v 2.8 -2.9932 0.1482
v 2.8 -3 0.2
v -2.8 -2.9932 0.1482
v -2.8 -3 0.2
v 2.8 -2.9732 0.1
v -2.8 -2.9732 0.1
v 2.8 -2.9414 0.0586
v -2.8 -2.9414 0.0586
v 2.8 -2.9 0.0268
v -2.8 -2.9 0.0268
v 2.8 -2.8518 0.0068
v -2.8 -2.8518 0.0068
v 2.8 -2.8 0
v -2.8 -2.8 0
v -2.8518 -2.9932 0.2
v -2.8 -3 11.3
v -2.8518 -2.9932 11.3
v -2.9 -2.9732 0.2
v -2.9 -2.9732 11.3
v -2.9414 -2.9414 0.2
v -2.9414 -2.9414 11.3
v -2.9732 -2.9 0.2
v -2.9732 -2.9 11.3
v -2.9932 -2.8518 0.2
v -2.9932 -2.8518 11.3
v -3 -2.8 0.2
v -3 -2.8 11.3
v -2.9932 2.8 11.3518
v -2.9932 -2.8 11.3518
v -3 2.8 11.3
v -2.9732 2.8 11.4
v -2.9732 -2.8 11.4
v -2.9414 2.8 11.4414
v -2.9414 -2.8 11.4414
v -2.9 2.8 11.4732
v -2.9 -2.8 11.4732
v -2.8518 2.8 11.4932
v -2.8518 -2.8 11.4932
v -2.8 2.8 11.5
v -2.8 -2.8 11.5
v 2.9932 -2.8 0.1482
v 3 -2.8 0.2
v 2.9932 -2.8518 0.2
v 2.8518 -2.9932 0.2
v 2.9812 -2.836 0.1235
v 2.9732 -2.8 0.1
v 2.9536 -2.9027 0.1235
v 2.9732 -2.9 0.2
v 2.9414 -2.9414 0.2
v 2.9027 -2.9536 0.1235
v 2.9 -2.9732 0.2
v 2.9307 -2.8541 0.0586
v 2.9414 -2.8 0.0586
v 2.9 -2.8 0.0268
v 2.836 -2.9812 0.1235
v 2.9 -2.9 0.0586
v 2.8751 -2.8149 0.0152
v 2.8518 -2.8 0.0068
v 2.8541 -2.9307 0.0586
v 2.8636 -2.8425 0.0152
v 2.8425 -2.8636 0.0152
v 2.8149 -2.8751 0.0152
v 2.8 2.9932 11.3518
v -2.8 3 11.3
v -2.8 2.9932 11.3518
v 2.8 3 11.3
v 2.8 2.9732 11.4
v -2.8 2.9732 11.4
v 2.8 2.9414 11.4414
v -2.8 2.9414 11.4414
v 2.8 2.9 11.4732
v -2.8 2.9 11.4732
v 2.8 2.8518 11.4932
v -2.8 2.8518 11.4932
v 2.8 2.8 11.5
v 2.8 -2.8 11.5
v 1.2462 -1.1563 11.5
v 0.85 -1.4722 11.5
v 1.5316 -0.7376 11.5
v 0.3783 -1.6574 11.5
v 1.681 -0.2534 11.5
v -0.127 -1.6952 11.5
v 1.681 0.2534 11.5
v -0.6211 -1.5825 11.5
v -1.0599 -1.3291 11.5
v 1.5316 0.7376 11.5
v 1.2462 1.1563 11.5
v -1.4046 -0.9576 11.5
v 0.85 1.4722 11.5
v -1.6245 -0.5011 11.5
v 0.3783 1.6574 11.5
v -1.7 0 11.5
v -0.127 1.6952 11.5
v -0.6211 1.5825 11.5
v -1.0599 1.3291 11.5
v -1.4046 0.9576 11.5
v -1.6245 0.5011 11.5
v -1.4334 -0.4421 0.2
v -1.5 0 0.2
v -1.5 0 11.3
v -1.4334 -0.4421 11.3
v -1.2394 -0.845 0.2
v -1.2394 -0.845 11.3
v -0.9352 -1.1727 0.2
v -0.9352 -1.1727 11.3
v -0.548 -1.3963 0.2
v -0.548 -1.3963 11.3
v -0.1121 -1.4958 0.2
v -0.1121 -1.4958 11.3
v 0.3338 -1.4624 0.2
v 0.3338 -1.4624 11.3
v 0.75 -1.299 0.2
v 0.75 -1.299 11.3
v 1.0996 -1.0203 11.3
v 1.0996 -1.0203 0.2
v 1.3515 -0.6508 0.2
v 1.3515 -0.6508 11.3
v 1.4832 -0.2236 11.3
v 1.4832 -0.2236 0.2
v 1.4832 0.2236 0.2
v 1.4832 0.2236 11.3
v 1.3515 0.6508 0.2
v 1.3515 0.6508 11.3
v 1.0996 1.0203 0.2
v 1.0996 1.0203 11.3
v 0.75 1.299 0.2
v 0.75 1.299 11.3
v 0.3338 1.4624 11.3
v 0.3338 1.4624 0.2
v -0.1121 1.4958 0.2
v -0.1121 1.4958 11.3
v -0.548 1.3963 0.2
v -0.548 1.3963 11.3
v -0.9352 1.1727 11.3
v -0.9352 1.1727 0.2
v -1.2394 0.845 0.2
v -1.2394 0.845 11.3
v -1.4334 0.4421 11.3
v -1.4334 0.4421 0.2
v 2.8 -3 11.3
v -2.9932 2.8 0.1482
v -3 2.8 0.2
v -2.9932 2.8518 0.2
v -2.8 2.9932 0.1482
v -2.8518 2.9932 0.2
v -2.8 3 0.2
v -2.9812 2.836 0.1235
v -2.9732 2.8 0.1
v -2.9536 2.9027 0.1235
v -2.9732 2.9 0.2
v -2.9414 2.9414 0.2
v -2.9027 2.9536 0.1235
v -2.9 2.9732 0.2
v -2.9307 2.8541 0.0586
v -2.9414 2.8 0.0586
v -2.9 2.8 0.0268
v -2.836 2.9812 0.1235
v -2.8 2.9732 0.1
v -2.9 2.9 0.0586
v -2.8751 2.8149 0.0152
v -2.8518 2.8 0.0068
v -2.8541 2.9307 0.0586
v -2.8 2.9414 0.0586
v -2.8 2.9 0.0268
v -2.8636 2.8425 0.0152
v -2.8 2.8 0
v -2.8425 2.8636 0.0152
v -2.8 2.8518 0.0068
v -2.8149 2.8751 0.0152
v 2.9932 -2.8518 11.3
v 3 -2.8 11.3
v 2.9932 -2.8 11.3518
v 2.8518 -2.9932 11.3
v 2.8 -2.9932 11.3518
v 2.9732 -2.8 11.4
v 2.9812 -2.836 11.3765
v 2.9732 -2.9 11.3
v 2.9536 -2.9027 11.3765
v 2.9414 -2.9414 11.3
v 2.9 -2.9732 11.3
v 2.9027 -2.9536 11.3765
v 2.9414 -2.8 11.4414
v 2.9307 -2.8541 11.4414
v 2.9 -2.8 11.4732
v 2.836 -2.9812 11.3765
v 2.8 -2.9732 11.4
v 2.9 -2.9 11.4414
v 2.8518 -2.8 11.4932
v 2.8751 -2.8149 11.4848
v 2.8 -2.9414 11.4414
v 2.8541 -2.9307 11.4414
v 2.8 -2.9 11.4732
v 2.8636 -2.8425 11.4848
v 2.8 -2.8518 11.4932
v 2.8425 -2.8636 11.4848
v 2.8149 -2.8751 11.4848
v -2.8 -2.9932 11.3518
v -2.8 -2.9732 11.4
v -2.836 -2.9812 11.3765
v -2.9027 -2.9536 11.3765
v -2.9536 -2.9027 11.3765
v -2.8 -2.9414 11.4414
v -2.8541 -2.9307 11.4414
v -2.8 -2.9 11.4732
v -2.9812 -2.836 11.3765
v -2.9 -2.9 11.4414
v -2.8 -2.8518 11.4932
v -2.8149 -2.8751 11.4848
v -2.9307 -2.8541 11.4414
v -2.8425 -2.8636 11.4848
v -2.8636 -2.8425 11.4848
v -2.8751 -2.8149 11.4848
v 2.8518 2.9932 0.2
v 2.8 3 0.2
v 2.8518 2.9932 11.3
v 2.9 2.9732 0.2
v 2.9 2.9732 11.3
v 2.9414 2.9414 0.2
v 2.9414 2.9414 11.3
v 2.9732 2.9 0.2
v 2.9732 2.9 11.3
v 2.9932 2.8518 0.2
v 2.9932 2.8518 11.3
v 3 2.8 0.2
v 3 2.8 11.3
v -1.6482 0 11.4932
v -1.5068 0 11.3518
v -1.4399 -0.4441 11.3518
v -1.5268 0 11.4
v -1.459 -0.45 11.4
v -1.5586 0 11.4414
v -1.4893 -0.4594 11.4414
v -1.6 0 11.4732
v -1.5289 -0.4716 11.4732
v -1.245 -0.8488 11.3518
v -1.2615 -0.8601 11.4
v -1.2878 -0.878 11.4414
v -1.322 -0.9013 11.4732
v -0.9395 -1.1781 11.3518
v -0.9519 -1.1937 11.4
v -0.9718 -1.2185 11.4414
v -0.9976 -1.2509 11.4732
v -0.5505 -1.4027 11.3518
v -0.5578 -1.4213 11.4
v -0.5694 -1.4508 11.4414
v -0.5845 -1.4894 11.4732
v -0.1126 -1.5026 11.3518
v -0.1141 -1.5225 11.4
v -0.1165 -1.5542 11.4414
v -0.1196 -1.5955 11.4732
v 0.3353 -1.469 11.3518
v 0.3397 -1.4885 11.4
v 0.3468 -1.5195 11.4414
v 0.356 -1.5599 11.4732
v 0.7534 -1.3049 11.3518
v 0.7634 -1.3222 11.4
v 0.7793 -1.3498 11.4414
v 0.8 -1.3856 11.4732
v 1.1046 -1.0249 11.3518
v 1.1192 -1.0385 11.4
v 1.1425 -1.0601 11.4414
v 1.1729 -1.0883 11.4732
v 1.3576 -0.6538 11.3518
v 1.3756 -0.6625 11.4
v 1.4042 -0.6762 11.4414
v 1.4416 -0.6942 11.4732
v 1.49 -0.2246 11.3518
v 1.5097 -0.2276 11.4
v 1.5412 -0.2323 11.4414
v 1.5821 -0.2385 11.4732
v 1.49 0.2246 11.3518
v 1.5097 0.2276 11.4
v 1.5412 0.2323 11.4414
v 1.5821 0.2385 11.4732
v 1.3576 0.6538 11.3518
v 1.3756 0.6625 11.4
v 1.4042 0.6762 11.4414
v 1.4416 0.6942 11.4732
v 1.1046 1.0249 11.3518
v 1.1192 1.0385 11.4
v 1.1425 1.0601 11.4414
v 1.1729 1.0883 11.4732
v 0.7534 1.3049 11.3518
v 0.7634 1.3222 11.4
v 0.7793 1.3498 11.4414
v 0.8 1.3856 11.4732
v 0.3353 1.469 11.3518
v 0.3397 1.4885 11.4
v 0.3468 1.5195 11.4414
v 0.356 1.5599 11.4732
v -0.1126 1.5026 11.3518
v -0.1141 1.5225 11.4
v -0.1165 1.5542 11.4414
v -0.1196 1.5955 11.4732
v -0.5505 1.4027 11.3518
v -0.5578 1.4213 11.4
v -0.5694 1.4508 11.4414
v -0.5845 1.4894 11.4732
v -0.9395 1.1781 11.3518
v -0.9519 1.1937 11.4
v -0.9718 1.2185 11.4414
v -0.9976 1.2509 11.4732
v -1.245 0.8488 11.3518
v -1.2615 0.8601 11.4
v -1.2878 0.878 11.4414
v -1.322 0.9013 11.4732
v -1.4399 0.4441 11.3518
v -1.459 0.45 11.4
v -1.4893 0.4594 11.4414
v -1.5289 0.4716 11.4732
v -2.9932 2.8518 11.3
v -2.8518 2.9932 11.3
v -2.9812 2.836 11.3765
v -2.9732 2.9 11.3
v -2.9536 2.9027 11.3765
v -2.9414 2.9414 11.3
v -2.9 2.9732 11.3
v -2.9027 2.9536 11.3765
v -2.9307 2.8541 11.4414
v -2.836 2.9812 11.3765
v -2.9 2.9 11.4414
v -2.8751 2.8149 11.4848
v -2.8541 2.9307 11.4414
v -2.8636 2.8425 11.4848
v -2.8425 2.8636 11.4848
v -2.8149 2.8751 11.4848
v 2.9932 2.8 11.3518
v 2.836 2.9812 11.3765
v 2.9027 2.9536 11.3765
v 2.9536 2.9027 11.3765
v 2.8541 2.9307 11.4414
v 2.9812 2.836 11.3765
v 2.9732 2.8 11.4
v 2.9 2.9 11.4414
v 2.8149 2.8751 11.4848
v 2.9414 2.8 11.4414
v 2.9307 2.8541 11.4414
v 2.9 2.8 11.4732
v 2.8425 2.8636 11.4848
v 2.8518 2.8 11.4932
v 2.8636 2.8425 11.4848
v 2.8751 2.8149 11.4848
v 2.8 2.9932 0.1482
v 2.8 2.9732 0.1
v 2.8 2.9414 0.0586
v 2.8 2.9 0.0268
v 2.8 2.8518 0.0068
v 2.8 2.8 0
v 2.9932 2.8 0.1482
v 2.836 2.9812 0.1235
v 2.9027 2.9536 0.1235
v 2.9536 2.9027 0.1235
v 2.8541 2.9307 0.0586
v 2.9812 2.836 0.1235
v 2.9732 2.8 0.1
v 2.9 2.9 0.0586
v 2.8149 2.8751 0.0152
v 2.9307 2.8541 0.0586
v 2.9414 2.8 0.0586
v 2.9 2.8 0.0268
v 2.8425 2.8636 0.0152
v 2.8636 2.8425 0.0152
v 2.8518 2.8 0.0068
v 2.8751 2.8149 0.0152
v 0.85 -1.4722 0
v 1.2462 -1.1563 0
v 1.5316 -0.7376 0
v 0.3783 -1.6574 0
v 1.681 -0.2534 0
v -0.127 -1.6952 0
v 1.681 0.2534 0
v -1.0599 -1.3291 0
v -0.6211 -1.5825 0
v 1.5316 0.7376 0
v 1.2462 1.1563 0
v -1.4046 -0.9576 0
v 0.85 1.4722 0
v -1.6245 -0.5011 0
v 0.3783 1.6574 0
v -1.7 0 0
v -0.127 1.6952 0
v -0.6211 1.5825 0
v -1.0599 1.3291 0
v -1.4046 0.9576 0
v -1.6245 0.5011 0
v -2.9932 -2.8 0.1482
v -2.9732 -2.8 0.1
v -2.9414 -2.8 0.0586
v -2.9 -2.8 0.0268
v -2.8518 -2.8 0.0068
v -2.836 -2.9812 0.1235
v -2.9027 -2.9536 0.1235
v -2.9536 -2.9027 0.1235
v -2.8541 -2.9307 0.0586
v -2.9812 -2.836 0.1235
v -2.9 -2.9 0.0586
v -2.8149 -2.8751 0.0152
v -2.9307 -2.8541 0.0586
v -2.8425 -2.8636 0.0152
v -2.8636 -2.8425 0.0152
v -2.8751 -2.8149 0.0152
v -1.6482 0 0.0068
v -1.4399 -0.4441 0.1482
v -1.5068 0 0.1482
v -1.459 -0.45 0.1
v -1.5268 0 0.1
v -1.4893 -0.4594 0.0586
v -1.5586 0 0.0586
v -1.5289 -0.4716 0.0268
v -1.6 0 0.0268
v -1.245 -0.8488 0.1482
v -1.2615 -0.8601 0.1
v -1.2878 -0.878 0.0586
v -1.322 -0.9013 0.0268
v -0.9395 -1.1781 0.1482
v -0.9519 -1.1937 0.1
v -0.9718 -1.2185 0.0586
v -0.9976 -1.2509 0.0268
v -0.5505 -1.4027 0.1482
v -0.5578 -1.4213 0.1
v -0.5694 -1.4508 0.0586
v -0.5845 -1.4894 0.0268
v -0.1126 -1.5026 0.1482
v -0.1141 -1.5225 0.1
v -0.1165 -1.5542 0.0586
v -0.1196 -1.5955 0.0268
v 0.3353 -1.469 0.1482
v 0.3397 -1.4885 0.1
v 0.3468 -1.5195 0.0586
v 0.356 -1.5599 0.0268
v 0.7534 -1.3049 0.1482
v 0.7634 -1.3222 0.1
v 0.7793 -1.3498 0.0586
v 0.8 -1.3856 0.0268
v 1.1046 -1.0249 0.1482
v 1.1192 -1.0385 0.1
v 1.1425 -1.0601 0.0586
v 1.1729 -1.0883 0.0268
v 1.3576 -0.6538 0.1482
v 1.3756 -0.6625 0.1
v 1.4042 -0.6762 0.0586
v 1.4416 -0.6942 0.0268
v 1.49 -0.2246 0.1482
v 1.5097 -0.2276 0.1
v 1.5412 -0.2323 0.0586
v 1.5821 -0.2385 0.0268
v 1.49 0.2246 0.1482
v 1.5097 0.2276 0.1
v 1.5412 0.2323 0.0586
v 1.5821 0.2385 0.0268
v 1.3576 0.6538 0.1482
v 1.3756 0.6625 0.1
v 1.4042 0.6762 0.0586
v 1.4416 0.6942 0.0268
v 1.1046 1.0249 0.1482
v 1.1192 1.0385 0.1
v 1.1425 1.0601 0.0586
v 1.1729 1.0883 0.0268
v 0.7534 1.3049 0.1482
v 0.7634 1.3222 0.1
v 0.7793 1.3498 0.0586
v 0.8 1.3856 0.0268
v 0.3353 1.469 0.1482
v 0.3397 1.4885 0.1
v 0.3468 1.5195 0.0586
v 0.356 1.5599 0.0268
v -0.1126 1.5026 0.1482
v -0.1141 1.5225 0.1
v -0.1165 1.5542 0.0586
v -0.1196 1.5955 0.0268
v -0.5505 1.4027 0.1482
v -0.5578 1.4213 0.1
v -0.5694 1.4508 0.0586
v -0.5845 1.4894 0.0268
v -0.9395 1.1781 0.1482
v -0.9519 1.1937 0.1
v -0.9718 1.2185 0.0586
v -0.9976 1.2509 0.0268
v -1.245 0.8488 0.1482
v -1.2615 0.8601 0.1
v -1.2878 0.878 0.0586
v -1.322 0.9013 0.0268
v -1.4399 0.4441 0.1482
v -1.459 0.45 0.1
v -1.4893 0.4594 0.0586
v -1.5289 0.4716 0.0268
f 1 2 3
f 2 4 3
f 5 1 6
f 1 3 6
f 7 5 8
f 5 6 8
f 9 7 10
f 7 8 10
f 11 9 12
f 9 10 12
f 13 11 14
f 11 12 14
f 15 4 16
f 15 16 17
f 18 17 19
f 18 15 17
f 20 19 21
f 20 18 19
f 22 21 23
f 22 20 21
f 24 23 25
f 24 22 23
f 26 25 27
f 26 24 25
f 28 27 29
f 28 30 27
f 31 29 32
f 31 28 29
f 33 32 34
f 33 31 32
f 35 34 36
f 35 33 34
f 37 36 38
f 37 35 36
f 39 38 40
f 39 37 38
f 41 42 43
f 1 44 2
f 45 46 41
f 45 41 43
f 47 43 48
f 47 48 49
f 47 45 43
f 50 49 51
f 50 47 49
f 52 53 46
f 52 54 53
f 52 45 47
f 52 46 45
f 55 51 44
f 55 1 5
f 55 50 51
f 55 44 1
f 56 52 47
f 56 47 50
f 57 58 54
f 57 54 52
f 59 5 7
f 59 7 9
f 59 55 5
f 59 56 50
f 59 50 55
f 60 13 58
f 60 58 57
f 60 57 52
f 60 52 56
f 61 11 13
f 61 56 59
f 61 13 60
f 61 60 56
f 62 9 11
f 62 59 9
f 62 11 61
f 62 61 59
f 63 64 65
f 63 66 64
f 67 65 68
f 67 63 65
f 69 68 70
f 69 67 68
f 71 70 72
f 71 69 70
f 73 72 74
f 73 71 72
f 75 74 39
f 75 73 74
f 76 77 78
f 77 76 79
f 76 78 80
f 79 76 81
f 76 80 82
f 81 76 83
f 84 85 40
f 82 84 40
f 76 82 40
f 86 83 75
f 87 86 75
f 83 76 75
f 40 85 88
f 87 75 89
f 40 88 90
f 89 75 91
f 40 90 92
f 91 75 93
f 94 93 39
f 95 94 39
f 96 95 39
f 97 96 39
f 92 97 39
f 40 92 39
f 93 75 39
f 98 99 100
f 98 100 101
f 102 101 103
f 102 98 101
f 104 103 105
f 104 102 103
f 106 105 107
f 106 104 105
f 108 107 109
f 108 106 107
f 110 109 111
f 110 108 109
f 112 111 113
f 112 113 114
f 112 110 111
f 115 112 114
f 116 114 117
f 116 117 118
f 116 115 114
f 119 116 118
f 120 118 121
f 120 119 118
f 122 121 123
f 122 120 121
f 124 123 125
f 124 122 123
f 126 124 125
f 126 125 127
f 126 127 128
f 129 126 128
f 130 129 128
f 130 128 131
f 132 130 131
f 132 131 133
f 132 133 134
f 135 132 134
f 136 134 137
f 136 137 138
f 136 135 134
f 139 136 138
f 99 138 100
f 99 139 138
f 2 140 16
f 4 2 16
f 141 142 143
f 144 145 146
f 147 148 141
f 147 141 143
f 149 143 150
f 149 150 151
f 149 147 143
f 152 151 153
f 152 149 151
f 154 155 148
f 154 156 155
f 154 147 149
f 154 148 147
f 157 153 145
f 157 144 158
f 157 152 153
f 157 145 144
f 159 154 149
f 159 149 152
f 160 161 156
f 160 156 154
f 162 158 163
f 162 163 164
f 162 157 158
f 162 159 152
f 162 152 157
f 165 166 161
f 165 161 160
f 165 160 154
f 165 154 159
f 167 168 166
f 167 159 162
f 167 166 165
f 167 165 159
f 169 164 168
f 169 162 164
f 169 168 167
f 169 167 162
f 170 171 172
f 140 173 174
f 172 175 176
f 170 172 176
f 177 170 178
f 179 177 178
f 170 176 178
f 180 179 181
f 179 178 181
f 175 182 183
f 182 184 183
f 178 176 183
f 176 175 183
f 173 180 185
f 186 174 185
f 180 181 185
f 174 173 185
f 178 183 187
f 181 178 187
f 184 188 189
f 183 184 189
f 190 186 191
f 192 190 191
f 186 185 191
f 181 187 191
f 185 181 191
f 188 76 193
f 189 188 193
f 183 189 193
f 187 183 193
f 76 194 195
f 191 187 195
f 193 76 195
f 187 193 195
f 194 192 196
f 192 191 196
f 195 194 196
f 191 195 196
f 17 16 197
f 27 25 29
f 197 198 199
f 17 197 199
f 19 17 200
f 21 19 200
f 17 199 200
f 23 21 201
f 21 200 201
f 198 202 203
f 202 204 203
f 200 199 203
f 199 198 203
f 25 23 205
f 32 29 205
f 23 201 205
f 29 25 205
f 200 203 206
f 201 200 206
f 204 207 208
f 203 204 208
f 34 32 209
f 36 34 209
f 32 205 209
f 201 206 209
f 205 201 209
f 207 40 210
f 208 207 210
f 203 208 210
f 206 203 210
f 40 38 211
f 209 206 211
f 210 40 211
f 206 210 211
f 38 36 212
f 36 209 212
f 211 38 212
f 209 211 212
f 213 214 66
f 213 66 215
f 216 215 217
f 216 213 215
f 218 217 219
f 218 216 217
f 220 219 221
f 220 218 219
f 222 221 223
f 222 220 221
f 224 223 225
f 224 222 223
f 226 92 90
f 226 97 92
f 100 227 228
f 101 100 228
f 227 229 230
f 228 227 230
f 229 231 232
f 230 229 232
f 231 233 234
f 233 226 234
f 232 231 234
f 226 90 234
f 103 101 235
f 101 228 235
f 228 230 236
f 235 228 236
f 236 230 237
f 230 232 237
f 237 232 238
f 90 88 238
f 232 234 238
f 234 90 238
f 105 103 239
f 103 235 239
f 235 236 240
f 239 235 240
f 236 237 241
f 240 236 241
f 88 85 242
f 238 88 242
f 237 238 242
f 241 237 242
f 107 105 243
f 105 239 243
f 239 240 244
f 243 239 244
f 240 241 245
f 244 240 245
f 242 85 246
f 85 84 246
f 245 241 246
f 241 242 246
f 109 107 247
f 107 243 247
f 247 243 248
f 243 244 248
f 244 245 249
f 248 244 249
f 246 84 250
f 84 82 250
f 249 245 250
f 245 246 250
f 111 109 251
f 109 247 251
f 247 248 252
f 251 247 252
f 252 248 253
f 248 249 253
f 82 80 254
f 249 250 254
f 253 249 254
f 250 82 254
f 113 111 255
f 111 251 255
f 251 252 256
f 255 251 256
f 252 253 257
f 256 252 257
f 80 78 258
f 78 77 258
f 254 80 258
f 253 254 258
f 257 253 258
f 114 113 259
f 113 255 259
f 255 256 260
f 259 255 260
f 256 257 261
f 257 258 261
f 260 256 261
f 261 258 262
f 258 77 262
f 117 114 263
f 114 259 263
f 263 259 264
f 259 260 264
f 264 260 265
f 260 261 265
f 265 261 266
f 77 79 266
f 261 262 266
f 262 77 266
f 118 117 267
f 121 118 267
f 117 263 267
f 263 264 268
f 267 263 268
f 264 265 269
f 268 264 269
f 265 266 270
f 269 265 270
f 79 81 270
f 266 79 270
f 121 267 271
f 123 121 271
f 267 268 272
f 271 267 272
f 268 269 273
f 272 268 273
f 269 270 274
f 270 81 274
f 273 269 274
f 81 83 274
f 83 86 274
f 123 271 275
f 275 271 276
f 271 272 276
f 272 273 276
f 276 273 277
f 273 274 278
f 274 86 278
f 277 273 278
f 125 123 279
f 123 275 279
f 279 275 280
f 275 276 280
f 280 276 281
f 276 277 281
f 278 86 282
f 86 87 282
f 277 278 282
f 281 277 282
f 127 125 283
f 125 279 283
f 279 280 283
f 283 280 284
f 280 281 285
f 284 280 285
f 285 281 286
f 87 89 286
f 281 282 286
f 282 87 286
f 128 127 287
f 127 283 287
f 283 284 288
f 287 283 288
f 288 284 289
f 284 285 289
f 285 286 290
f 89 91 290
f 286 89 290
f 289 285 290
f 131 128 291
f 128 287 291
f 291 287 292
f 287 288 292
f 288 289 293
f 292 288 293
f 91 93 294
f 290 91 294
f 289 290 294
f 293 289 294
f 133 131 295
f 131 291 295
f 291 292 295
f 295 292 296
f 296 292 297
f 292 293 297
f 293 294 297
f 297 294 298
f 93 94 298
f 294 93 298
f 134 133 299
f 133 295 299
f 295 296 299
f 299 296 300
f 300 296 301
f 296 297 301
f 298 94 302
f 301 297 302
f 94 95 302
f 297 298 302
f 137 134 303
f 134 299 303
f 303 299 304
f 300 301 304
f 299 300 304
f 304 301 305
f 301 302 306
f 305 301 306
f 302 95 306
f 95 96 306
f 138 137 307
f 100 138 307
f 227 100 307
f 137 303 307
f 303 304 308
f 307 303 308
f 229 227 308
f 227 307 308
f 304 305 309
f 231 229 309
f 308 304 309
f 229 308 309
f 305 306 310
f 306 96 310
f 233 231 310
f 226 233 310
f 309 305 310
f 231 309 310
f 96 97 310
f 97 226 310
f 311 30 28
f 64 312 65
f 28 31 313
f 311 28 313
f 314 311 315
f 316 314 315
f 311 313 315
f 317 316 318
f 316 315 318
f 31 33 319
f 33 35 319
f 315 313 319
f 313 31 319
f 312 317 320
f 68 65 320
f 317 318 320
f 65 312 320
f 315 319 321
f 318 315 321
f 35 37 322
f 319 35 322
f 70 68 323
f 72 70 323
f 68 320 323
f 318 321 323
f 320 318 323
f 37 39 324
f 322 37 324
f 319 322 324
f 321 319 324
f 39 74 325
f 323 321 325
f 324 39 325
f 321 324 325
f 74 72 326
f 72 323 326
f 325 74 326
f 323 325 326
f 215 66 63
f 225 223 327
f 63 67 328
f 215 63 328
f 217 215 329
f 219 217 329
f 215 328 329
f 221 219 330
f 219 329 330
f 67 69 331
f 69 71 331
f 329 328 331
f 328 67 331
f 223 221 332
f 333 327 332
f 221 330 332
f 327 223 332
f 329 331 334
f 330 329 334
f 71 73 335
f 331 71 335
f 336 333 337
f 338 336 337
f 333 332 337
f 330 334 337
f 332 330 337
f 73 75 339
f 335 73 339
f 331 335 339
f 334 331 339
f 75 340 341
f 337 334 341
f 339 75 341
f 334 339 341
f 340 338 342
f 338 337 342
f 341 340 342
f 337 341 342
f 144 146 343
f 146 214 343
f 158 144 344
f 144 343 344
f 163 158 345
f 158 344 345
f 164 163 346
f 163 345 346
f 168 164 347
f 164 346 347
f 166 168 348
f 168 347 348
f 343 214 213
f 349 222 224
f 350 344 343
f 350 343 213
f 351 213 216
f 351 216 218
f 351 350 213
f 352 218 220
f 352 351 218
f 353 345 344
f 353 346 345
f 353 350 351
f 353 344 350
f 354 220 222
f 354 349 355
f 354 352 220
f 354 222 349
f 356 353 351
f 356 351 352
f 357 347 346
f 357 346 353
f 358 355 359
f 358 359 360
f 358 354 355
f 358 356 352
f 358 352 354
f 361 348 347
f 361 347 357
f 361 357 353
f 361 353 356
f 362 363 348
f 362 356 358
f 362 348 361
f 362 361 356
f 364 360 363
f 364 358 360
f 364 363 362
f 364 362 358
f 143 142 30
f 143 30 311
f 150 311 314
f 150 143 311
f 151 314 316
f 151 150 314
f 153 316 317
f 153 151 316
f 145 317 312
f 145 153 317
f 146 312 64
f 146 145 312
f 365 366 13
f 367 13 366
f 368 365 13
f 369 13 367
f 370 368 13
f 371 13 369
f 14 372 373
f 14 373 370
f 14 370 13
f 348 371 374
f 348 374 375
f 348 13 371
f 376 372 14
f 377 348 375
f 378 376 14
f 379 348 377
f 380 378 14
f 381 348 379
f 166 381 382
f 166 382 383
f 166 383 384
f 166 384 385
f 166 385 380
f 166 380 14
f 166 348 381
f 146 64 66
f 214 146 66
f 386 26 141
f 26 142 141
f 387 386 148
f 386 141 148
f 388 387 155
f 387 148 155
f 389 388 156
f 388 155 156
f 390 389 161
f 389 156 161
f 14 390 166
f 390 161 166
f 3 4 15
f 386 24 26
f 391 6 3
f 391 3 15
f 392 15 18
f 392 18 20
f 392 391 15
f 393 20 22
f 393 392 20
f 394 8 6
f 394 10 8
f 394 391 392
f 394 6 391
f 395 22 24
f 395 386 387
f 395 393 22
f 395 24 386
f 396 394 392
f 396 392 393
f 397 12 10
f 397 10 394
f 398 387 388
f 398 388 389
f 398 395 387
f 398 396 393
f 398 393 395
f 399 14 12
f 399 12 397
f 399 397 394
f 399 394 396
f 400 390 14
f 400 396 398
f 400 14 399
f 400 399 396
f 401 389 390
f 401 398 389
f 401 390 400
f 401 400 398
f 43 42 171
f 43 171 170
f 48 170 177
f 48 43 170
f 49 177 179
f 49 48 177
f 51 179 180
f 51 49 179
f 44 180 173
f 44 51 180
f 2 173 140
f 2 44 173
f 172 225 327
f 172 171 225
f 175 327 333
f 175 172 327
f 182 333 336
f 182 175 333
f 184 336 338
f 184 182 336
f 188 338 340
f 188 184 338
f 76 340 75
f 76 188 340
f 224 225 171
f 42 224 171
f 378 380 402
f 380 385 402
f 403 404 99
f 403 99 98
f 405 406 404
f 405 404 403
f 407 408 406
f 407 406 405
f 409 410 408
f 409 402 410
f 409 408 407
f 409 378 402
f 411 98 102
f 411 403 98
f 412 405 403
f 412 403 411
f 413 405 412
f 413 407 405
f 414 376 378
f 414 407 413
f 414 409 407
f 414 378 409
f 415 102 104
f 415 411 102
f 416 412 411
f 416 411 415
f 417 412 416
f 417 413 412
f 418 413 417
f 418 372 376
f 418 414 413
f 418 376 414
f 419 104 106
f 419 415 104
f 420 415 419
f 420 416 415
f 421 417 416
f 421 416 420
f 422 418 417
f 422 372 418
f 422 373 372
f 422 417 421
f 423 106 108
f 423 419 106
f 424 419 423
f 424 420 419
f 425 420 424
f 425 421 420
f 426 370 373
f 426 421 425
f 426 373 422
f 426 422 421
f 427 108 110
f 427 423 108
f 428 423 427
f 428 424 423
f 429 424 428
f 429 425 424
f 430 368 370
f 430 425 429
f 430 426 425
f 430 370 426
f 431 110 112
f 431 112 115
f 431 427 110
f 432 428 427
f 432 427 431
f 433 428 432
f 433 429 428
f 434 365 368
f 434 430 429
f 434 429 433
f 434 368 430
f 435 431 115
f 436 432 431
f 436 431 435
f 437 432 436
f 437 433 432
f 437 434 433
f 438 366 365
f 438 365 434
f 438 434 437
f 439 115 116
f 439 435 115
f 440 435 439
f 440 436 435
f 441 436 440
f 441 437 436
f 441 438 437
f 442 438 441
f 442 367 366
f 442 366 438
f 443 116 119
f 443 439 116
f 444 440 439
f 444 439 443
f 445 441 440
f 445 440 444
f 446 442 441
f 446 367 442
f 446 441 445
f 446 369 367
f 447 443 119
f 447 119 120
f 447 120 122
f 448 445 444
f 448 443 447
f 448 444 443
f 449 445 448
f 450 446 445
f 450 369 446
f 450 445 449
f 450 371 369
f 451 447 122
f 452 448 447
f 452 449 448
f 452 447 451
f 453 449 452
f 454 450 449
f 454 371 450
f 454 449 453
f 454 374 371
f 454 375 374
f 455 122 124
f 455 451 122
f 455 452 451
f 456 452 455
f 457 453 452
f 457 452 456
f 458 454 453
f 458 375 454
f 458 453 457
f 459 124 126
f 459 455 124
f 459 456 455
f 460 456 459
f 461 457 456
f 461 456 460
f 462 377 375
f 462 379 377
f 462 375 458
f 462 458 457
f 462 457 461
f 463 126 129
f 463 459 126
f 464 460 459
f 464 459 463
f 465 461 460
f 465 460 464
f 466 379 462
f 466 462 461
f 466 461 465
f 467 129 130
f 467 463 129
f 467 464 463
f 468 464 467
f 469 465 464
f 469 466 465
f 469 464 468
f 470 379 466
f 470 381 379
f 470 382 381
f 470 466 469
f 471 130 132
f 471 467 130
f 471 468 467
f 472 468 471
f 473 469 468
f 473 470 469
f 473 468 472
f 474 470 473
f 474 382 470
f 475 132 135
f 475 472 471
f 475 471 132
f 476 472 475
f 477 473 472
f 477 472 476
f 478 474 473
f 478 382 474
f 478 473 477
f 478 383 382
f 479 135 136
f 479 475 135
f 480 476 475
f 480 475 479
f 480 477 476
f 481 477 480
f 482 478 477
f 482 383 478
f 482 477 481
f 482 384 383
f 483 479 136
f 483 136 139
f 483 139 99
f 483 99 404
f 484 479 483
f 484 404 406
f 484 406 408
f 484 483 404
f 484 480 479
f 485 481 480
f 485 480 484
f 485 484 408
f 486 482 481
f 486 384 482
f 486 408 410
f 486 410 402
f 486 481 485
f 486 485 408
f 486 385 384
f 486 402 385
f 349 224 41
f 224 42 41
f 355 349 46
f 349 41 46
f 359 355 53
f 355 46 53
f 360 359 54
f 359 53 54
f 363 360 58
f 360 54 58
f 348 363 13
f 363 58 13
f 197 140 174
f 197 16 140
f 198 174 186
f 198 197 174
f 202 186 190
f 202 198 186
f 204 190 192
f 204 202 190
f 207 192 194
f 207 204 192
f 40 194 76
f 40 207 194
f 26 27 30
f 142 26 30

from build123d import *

# Parameters (mm, degrees)
ESQUISSE1_R      = 1.5
EXTRUSION1_DEPTH = 11.5
CONG_1_R         = 0.2


with BuildPart() as part:
    # Esquisse1 → Extrusion1 (new body)
    with BuildSketch(Plane.XY):
        with BuildLine():
            Line((-2.8, 3), (2.8, 3))
            ThreePointArc((2.8, 3), (2.941421356, 2.941421356), (3, 2.8))
            Line((3, 2.8), (3, -2.8))
            ThreePointArc((3, -2.8), (2.941421356, -2.941421356), (2.8, -3))
            Line((2.8, -3), (-2.8, -3))
            ThreePointArc((-2.8, -3), (-2.941421356, -2.941421356), (-3, -2.8))
            Line((-3, -2.8), (-3, 2.8))
            ThreePointArc((-3, 2.8), (-2.941421356, 2.941421356), (-2.8, 3))
        make_face()
        with Locations(Location((0, 0, 0), (0, 0, 180))):
            Circle(ESQUISSE1_R, mode=Mode.SUBTRACT)
    extrude(amount=EXTRUSION1_DEPTH)

    # Congé1
    cong_1_edges = [part.edges().sort_by_distance(p)[0] for p in [
        (0, 3, 0),
        (0, 3, 11.5),
        (2.941421356, 2.941421356, 0),
        (2.941421356, 2.941421356, 11.5),
        (3, 0, 0),
        (3, 0, 11.5),
        (2.941421356, -2.941421356, 0),
        (2.941421356, -2.941421356, 11.5),
        (0, -3, 0),
        (0, -3, 11.5),
        (-2.941421356, -2.941421356, 0),
        (-2.941421356, -2.941421356, 11.5),
        (-3, 0, 0),
        (-3, 0, 11.5),
        (-2.941421356, 2.941421356, 0),
        (-2.941421356, 2.941421356, 11.5),
        (1.5, 0, 0),
        (1.5, 0, 11.5),
    ]]
    fillet(cong_1_edges, radius=CONG_1_R)


solid = part.part
